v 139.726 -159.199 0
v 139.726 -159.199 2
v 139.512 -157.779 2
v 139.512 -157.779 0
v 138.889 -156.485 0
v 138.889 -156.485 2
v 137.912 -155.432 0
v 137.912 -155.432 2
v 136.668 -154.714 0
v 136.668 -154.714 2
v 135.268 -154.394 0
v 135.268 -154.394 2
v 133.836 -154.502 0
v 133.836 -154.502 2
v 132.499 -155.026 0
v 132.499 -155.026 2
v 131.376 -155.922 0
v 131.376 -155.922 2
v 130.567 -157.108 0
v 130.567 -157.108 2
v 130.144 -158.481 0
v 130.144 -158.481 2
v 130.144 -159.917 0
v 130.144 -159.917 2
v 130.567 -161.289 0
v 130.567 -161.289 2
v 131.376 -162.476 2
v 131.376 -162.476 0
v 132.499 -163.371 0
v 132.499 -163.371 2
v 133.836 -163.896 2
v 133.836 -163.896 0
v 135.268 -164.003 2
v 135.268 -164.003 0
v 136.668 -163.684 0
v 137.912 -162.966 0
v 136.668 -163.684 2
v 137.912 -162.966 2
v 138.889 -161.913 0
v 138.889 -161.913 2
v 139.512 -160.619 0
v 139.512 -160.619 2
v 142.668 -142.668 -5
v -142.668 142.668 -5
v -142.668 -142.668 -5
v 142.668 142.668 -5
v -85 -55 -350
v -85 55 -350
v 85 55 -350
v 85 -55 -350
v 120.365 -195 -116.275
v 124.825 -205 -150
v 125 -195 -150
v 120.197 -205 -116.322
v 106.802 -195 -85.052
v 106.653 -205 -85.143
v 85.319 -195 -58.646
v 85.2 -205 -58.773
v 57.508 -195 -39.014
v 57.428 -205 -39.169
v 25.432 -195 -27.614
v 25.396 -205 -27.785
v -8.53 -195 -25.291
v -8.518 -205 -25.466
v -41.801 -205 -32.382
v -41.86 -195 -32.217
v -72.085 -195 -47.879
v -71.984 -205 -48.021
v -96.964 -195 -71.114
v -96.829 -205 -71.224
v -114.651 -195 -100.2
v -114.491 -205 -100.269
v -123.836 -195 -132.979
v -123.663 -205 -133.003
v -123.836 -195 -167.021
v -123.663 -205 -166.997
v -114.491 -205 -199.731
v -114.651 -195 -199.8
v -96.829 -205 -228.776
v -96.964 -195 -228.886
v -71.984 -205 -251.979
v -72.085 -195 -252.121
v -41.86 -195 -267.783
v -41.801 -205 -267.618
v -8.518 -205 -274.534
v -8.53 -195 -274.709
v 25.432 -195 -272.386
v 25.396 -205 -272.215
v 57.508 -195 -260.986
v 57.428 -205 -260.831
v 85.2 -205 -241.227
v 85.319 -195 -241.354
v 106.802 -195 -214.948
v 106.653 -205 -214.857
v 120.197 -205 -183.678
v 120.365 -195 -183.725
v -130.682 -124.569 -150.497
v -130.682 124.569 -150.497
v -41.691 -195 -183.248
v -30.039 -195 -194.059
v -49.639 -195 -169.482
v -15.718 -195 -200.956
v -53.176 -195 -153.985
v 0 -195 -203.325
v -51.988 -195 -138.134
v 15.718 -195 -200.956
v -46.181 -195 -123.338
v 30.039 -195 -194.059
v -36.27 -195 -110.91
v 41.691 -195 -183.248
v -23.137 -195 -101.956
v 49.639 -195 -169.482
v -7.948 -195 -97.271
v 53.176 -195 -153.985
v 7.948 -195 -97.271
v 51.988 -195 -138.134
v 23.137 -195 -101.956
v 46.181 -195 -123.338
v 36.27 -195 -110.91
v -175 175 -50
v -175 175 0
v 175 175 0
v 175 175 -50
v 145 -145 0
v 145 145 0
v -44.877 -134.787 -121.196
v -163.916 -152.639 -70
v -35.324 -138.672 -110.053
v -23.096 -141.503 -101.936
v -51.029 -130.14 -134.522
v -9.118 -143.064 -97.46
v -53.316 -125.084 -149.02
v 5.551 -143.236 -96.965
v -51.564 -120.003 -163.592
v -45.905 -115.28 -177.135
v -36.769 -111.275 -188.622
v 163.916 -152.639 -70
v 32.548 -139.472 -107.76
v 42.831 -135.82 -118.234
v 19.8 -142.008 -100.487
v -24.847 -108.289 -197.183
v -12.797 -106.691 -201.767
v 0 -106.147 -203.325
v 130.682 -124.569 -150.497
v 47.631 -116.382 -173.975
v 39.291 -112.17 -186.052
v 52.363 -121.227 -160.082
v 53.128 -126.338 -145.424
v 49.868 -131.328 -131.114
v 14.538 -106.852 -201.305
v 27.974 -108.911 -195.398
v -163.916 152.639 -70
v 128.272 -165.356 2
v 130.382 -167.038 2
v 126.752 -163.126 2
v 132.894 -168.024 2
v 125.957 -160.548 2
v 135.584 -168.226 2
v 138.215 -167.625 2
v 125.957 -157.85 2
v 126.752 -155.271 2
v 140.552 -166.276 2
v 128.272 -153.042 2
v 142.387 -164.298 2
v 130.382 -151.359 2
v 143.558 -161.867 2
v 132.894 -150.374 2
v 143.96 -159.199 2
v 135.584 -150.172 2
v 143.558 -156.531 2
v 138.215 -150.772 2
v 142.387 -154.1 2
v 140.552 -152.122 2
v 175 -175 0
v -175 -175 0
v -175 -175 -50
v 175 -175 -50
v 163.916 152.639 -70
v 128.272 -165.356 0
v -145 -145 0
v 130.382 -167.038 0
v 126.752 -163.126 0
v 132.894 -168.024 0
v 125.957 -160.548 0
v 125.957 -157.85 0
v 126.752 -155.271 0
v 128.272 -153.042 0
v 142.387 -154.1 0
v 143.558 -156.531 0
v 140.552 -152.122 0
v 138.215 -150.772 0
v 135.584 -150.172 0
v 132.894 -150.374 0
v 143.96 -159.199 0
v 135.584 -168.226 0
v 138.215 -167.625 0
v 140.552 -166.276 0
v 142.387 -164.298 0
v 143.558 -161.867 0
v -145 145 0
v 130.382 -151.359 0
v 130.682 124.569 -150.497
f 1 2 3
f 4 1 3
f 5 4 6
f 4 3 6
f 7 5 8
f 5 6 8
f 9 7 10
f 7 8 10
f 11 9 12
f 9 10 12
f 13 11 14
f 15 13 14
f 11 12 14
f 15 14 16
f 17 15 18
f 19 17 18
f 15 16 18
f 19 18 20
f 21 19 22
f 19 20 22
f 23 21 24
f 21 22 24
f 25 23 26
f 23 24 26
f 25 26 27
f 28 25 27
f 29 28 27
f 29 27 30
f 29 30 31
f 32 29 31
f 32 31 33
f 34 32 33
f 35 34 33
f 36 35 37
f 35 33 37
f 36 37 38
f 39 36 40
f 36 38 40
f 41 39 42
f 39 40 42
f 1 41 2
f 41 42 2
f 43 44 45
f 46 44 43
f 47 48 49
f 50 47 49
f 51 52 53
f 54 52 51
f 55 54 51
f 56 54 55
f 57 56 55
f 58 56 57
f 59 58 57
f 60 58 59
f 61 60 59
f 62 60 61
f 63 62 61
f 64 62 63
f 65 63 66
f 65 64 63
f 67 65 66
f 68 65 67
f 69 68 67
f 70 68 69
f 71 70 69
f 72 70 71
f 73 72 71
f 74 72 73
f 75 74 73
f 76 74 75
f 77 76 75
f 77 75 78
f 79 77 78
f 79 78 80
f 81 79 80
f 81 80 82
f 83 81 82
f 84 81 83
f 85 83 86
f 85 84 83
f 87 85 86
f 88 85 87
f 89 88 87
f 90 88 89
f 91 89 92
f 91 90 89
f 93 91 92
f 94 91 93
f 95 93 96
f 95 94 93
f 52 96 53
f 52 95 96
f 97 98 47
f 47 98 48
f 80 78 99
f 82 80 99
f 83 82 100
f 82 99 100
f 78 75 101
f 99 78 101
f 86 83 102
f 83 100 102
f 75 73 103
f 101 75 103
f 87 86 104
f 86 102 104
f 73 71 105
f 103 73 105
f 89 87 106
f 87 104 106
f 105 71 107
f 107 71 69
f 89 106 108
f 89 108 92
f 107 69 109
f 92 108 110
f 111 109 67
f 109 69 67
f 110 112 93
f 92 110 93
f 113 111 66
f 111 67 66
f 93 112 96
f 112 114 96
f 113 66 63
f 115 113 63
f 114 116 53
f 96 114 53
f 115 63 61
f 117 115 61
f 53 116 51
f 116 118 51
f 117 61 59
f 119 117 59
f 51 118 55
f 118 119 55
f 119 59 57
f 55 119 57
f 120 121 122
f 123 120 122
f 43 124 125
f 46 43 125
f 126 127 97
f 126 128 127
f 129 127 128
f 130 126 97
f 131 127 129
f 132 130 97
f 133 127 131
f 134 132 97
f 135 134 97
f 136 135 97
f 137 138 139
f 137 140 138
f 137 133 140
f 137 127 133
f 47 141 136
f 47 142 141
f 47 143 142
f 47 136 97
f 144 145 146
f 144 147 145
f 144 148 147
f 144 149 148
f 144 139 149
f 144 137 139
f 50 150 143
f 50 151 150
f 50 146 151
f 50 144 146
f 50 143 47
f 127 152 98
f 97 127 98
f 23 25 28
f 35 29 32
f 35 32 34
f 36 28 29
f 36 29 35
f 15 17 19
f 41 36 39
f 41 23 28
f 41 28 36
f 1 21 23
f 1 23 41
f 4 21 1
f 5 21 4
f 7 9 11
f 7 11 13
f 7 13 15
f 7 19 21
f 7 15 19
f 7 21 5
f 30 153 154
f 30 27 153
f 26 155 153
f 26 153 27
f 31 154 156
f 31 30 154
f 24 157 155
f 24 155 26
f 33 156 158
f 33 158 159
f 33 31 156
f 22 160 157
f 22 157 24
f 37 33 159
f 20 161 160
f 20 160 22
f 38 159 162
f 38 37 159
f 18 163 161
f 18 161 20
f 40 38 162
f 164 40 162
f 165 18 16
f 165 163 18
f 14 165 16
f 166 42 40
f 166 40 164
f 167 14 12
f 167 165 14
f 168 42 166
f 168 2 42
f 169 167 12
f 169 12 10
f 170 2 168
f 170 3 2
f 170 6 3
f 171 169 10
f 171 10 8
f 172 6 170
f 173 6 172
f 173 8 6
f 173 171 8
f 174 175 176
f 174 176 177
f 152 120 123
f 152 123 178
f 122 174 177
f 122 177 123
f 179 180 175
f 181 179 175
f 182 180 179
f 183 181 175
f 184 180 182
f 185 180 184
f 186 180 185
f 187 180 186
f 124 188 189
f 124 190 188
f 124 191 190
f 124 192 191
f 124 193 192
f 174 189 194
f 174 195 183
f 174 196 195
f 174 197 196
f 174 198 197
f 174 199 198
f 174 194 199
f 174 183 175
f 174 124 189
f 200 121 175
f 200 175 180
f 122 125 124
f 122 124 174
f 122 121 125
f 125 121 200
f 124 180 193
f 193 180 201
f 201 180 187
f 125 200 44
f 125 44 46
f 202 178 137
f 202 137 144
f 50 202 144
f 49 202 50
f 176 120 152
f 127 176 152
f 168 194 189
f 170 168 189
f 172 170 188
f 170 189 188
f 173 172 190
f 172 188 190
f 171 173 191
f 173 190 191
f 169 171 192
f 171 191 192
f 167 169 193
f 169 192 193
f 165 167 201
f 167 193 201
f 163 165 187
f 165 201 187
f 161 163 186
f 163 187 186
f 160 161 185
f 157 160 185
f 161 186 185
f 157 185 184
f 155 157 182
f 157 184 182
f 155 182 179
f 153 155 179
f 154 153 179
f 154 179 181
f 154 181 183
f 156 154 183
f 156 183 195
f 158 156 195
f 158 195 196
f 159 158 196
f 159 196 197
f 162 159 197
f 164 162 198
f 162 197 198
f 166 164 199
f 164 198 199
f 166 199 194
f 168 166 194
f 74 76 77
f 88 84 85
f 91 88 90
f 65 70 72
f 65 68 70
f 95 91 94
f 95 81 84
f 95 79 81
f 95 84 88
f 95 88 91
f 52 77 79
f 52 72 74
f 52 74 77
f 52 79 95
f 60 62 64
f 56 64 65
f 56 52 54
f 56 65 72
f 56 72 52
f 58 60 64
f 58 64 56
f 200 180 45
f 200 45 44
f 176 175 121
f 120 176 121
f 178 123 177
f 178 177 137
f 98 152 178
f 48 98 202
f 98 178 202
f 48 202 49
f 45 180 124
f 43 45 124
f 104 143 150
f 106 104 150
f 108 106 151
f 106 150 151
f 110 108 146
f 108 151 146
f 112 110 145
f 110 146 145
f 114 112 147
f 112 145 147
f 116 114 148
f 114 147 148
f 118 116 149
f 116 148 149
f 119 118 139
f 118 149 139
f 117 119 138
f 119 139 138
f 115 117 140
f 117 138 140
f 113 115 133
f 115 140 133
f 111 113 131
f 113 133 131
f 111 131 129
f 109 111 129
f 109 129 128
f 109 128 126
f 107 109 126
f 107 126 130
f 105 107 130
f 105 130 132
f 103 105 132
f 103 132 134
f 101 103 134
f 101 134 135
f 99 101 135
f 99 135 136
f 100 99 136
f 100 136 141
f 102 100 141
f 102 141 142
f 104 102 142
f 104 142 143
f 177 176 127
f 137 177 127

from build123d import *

# Parameters (mm, degrees)
CROQUIS1_W                   = 350
CROQUIS1_H                   = 350
SALIENTE_EXTRUIR1_DEPTH      = 350
CROQUIS2_W                   = 290
CROQUIS2_H                   = 290
CORTAR_EXTRUIR1_DEPTH        = 5
CORTAR_EXTRUIR1_DRAFT        = -25
CORTAR_EXTRUIR2_REACH        = 527
CORTAR_EXTRUIR3_REACH        = 527
SALIENTE_EXTRUIR2_DEPTH      = 20
SALIENTE_EXTRUIR2_DEPTH_BACK = 85
CROQUIS5_R                   = 53.324987264
CROQUIS6_R                   = 125
SALIENTE_EXTRUIR3_DEPTH      = 10
SALIENTE_EXTRUIR3_TAPER      = 1
CROQUIS7_R                   = 9.05214815
SALIENTE_EXTRUIR4_DEPTH      = 2
CROQUIS8_R                   = 4.817972318
CORTAR_EXTRUIR4_DEPTH        = 2


with BuildPart() as part:
    # Croquis1 → Saliente-Extruir1 (new body)
    with BuildSketch(Plane.XY):
        Rectangle(CROQUIS1_W, CROQUIS1_H)
    extrude(amount=-SALIENTE_EXTRUIR1_DEPTH)


with BuildPart() as cortar_extruir1_tool:
    # Croquis2 → Cortar-Extruir1 (with draft: the straight prism first)
    with BuildSketch(Plane.XY):
        Rectangle(CROQUIS2_W, CROQUIS2_H)
    extrude(amount=-CORTAR_EXTRUIR1_DEPTH)
    # Cortar-Extruir1: the draft: its side faces are tilted about the plane it starts from
    cortar_extruir1_sides = [cortar_extruir1_tool.faces().sort_by_distance(p)[0] for p in [
        (-145, 0, -2.5),
        (0, -145, -2.5),
        (145, 0, -2.5),
        (0, 145, -2.5),
    ]]
    draft(cortar_extruir1_sides, Plane.XY, CORTAR_EXTRUIR1_DRAFT)


with BuildPart() as part_1:
    add(part.part)

    # Cortar-Extruir1: cut by cortar_extruir1_tool
    add(cortar_extruir1_tool.part, mode=Mode.SUBTRACT)

    # Croquis3 → Cortar-Extruir2 (cut, up to next)
    with BuildSketch(Plane(origin=(175, 0, 0), x_dir=(0, 0, -1), z_dir=(1, 0, 0)), mode=Mode.PRIVATE) as cortar_extruir2_sk1:
        Polygon((50, 175), (70, 152.639320225), (350, 55), (350, 175), align=None)
    cortar_extruir2_tool1 = extrude(cortar_extruir2_sk1.sketch, amount=-CORTAR_EXTRUIR2_REACH, mode=Mode.PRIVATE) & part_1.part
    # Croquis3 → Cortar-Extruir2 (cut, up to next)
    with BuildSketch(Plane(origin=(175, 0, 0), x_dir=(0, 0, -1), z_dir=(1, 0, 0)), mode=Mode.PRIVATE) as cortar_extruir2_sk2:
        Polygon((350, -175), (50, -175), (70, -152.639320225), (350, -55), align=None)
    cortar_extruir2_tool2 = extrude(cortar_extruir2_sk2.sketch, amount=-CORTAR_EXTRUIR2_REACH, mode=Mode.PRIVATE) & part_1.part
    add(cortar_extruir2_tool1.solids().sort_by_distance((175, 134.203352, -240.024387))[0], mode=Mode.SUBTRACT)
    add(cortar_extruir2_tool2.solids().sort_by_distance((175, -134.203352, -240.024387))[0], mode=Mode.SUBTRACT)

    # Croquis4 → Cortar-Extruir3 (cut, up to next)
    with BuildSketch(Plane(origin=(0, 175, 0), x_dir=(1, 0, 0), z_dir=(0, 1, 0)), mode=Mode.PRIVATE) as cortar_extruir3_sk1:
        Polygon((-85, 350), (-175, 350), (-175, 50), (-163.915974354, 70), (-130.682151375, 150.497096617), align=None)
    cortar_extruir3_tool1 = extrude(cortar_extruir3_sk1.sketch, amount=-CORTAR_EXTRUIR3_REACH, mode=Mode.PRIVATE) & part_1.part
    # Croquis4 → Cortar-Extruir3 (cut, up to next)
    with BuildSketch(Plane(origin=(0, 175, 0), x_dir=(1, 0, 0), z_dir=(0, 1, 0)), mode=Mode.PRIVATE) as cortar_extruir3_sk2:
        Polygon((130.682151375, 150.497096617), (85, 350), (175, 350), (175, 50), (163.915974354, 70), align=None)
    cortar_extruir3_tool2 = extrude(cortar_extruir3_sk2.sketch, amount=-CORTAR_EXTRUIR3_REACH, mode=Mode.PRIVATE) & part_1.part
    add(cortar_extruir3_tool1.solids().sort_by_distance((-143.088568, 175, -239.864683))[0], mode=Mode.SUBTRACT)
    add(cortar_extruir3_tool2.solids().sort_by_distance((143.088568, 175, -239.864683))[0], mode=Mode.SUBTRACT)

    # Croquis5 → Saliente-Extruir2 (add, two sides: drawn at the far end of the back side and taken through both)
    with BuildSketch(Plane.XZ.offset(175).offset(-SALIENTE_EXTRUIR2_DEPTH_BACK)):
        with Locations(Location((0, -150, 0), (0, 0, 270))):
            Circle(CROQUIS5_R)
    extrude(amount=SALIENTE_EXTRUIR2_DEPTH + SALIENTE_EXTRUIR2_DEPTH_BACK)

    # Croquis6 → Saliente-Extruir3 (add)
    with BuildSketch(Plane.XZ.offset(195)):
        with Locations((0, -150)):
            Circle(CROQUIS6_R)
    extrude(amount=SALIENTE_EXTRUIR3_DEPTH, taper=SALIENTE_EXTRUIR3_TAPER)

    # Croquis7 → Saliente-Extruir4 (add)
    with BuildSketch(Plane.XY):
        with Locations((134.907856816, -159.198773435)):
            Circle(CROQUIS7_R)
    extrude(amount=SALIENTE_EXTRUIR4_DEPTH)

    # Croquis8 → Cortar-Extruir4 (cut)
    with BuildSketch(Plane.XY.offset(2)):
        with Locations((134.907856816, -159.198773435)):
            Circle(CROQUIS8_R)
    extrude(amount=-CORTAR_EXTRUIR4_DEPTH, mode=Mode.SUBTRACT)


solid = part_1.part
